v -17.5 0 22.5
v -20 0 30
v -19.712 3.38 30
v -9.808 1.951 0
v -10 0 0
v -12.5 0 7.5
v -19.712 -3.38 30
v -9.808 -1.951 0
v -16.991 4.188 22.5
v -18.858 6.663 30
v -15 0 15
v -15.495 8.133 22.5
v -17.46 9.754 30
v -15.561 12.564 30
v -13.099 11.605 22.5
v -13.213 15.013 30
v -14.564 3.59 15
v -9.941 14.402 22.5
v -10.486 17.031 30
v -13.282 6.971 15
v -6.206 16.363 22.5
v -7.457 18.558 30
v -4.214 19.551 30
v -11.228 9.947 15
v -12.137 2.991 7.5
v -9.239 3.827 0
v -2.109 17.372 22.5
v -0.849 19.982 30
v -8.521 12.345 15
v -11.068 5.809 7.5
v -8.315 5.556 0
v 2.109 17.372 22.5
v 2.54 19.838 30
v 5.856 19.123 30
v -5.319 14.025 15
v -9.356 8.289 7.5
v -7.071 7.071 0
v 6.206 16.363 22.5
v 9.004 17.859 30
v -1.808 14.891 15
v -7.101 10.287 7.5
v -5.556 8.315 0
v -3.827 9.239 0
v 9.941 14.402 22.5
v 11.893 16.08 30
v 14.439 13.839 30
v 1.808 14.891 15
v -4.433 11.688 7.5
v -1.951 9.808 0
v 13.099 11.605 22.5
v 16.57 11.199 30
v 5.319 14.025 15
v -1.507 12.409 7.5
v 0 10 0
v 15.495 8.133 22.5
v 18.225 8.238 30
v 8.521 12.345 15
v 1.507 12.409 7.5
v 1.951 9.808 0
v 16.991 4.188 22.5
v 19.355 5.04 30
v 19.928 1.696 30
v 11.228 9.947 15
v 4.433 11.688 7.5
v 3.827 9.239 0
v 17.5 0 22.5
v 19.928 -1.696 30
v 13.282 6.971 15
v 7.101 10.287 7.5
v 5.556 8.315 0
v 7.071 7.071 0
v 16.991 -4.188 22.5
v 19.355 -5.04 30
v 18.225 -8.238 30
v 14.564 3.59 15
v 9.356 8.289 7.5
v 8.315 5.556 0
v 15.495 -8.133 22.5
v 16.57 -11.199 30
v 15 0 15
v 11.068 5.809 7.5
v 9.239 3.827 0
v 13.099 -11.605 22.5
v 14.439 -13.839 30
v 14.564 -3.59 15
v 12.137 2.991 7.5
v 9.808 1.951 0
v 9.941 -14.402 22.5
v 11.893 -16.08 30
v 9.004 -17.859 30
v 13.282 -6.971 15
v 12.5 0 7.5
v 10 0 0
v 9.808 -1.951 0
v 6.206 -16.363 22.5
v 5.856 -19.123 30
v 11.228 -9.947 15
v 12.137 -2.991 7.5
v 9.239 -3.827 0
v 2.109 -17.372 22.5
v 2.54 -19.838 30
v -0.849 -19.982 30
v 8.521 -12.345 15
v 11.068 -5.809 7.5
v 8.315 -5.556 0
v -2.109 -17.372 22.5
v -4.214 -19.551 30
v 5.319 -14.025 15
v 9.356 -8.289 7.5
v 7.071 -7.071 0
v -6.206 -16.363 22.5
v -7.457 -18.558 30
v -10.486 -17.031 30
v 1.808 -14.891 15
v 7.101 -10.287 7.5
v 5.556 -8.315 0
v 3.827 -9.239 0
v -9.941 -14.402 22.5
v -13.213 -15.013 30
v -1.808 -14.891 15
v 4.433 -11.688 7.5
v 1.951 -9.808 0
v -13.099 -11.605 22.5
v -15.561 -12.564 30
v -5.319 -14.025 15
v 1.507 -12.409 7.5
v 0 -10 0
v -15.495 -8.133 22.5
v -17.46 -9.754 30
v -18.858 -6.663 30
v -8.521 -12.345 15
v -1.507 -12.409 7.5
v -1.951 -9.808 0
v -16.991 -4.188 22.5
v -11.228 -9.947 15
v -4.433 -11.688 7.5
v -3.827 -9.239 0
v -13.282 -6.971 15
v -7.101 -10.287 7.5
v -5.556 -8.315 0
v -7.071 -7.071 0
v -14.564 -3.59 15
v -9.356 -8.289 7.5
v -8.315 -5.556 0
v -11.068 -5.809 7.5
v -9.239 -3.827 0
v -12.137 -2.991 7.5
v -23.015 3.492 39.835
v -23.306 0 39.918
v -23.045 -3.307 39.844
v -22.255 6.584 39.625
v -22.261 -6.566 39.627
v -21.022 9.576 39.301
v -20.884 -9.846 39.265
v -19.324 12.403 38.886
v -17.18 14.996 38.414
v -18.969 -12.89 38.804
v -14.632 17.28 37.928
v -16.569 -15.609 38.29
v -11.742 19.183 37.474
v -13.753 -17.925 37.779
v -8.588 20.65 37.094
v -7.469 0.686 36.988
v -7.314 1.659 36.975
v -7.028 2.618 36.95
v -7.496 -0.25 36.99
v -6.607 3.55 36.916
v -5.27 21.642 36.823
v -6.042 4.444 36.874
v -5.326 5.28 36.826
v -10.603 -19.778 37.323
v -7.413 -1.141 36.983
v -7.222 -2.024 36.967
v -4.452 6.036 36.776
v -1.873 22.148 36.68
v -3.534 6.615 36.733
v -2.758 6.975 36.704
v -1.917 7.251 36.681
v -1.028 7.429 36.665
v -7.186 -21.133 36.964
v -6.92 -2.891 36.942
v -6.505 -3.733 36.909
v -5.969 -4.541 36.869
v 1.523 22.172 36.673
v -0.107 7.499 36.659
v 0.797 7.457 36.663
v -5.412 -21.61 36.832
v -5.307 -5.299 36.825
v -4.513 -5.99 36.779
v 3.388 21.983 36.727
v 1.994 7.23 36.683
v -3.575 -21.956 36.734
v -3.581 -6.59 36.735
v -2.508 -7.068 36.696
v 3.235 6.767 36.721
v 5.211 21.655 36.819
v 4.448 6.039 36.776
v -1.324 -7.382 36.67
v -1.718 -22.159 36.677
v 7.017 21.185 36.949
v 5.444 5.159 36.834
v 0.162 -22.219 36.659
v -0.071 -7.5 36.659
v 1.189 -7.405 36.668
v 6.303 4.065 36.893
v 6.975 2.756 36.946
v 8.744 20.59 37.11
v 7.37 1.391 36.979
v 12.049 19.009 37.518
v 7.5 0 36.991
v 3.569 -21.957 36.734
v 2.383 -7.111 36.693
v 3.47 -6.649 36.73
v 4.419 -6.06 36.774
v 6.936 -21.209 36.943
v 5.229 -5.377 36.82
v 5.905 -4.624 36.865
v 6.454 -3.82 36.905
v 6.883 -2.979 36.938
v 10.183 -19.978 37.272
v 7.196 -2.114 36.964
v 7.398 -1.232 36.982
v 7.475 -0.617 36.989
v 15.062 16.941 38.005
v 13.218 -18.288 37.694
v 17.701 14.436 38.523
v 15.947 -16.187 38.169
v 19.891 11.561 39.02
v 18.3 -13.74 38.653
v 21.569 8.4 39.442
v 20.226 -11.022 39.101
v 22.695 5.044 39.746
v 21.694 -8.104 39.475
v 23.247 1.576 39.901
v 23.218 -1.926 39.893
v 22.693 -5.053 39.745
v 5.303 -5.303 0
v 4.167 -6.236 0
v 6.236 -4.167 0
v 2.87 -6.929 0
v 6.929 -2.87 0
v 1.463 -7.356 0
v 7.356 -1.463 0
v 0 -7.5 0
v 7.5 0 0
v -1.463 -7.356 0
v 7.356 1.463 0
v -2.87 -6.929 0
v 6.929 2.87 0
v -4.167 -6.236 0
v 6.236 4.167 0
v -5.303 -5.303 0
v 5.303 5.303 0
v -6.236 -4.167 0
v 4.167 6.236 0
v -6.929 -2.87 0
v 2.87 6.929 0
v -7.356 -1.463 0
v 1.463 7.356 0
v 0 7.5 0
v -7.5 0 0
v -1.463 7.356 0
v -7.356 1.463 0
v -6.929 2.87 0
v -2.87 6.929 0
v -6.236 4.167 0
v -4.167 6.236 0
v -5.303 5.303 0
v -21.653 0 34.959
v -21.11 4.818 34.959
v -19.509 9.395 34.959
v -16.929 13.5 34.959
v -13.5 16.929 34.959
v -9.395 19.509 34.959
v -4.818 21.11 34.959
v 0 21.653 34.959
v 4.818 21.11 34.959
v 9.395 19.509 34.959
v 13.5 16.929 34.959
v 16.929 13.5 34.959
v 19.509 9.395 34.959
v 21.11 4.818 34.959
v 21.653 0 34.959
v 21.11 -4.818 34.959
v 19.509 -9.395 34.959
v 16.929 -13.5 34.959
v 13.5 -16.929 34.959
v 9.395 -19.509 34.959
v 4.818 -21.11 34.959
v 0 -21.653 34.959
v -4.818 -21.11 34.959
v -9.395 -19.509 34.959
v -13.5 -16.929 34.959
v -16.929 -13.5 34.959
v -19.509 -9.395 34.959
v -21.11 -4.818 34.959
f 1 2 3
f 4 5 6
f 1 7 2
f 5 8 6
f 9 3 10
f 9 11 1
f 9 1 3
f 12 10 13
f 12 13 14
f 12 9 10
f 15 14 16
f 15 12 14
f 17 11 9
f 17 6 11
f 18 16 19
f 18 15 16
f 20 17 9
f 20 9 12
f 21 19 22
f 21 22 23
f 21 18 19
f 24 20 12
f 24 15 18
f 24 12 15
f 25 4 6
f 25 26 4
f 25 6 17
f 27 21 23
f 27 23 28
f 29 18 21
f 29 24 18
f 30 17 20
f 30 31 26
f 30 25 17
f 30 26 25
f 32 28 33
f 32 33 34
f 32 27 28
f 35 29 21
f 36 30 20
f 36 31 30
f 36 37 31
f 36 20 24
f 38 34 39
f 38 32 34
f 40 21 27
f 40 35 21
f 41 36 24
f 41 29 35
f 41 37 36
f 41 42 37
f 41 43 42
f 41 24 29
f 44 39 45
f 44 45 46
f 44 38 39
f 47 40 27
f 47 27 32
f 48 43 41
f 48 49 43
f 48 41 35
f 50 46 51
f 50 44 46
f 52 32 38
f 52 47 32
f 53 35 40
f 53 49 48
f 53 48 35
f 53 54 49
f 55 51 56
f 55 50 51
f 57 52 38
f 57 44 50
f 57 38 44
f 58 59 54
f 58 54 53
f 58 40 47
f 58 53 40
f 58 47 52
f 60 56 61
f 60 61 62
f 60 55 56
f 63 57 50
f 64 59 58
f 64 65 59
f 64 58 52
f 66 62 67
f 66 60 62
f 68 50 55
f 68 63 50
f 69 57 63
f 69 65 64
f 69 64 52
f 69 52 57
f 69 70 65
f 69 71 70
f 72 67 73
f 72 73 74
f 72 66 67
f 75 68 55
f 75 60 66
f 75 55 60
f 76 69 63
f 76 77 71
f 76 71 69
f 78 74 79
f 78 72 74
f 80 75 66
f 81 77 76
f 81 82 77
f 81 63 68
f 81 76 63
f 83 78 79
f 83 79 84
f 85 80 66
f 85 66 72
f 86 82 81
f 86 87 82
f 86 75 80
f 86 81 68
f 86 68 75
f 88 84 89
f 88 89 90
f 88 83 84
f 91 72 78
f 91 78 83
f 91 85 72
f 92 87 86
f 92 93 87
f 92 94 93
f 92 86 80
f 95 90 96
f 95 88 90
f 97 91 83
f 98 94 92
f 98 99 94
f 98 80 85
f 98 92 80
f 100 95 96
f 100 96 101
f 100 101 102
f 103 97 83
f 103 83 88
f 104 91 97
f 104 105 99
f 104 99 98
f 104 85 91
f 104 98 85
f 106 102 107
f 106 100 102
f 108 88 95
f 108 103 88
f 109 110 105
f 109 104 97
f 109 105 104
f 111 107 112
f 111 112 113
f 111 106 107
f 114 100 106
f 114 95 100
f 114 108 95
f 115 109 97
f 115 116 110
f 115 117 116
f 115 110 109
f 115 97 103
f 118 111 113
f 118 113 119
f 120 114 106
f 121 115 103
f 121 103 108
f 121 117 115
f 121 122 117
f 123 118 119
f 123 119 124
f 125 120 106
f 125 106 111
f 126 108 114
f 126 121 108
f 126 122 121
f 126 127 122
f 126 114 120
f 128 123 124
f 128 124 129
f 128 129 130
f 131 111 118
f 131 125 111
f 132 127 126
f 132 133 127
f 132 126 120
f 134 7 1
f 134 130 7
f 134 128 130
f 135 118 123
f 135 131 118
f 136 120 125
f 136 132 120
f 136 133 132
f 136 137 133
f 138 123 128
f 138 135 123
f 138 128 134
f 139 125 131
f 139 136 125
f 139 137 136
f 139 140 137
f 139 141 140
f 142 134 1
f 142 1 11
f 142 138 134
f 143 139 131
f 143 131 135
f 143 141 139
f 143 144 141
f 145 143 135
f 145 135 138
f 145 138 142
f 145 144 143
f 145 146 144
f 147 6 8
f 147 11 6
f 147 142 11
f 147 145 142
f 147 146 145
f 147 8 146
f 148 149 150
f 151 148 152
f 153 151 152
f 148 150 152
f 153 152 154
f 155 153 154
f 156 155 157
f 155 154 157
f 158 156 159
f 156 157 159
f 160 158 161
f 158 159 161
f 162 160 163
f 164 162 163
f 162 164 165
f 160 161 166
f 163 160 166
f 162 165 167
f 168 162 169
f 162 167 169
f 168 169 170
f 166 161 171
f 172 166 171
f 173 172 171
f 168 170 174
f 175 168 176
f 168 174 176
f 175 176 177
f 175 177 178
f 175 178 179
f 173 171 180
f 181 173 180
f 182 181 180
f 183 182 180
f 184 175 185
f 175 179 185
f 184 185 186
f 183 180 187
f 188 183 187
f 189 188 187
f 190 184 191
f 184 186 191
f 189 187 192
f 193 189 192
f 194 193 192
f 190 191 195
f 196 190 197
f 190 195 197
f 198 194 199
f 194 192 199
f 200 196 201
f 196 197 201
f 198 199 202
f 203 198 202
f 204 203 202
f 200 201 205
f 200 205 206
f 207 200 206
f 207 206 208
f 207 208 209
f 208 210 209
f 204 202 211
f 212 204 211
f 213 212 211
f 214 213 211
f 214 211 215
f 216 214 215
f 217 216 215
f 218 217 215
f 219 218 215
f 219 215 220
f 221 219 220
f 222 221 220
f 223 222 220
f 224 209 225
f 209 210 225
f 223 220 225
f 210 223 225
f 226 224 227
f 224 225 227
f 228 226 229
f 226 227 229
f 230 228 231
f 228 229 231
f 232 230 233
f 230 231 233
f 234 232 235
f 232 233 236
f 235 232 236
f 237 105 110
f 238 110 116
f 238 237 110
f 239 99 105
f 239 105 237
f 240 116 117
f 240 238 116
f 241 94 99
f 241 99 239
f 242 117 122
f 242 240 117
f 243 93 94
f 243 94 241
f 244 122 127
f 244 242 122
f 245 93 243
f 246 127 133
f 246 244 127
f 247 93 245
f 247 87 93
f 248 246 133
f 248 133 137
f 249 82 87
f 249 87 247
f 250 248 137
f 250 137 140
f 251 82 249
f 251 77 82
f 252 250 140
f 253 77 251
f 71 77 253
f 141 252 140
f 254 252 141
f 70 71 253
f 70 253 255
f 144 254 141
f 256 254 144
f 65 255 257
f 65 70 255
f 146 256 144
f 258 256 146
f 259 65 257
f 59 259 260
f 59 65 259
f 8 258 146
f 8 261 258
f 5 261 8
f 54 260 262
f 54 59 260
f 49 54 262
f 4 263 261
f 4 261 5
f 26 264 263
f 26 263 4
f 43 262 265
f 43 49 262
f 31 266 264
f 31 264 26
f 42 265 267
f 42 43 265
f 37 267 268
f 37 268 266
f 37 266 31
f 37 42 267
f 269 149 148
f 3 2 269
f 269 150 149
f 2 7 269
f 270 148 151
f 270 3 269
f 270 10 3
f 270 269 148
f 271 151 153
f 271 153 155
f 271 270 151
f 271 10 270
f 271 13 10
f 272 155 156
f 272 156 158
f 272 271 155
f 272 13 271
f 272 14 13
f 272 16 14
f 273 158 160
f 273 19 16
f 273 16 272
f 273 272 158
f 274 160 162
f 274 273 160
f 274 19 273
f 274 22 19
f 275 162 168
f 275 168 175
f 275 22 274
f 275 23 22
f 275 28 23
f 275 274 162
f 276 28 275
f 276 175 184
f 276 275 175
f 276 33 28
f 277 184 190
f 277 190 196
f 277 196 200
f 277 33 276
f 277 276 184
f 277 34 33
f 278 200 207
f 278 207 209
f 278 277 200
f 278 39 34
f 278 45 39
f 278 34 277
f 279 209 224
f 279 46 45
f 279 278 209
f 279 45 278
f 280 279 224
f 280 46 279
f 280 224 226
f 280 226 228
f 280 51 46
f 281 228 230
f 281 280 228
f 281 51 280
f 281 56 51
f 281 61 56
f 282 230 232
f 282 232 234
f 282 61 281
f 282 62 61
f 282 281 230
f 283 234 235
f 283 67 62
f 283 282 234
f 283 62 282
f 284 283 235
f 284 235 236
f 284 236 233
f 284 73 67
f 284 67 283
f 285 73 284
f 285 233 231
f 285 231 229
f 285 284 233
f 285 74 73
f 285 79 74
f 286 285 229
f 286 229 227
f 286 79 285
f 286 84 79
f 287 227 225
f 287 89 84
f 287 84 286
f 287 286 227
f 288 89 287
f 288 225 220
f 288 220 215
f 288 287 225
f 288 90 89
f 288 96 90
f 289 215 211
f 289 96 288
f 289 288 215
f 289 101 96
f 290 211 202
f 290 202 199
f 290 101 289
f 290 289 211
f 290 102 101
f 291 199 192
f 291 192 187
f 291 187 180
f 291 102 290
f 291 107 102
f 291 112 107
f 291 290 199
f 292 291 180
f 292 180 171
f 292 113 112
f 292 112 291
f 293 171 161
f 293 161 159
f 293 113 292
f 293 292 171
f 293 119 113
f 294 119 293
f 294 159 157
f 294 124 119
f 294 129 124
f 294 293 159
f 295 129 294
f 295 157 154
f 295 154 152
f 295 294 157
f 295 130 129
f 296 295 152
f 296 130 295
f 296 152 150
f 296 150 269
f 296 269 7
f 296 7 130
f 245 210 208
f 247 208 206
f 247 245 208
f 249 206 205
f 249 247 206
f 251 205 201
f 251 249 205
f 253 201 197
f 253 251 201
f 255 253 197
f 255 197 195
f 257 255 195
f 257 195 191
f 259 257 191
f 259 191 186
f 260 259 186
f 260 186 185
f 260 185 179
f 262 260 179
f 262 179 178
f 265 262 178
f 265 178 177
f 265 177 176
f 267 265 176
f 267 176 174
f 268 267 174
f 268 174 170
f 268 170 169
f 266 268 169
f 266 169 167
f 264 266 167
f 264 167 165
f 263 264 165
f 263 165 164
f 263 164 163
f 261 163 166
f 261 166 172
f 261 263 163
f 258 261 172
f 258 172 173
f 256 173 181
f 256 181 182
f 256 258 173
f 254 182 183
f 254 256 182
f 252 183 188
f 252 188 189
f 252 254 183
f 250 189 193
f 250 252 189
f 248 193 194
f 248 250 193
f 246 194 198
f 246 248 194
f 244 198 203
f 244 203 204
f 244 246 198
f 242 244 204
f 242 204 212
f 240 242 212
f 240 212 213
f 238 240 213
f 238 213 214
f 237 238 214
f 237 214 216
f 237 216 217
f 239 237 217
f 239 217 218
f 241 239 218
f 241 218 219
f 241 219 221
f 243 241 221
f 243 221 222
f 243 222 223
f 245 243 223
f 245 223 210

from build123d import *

# Parameters (mm, degrees)
F2_R     = 7.5
F3_DEPTH = 50
F5_DEPTH = 25


with BuildPart() as f1:
    # F0 (on Front) → F1 (revolve)
    with BuildSketch(Plane.XZ):
        Polygon((-20, 30), (-10, 0), (0, 0), (0, 40), (-23.333333, 40), align=None)
    revolve(axis=Axis((0, 0, 20), (0, 0, -1)))

    # F2 (on Top) → F3 (cut)
    with BuildSketch(Plane.XY):
        Circle(F2_R)
    extrude(amount=F3_DEPTH, mode=Mode.SUBTRACT)

    # F4 (on Front) → F5 (cut, symmetric)
    with BuildSketch(Plane.XZ):
        with BuildLine():
            ThreePointArc((39.268938, 46.276736), (0, 57.353531), (-39.268938, 46.276736))
            ThreePointArc((-39.268938, 46.276736), (0, 36.659249), (39.268938, 46.276736))
        make_face()
    extrude(amount=F5_DEPTH, both=True, mode=Mode.SUBTRACT)


solid = f1.part
